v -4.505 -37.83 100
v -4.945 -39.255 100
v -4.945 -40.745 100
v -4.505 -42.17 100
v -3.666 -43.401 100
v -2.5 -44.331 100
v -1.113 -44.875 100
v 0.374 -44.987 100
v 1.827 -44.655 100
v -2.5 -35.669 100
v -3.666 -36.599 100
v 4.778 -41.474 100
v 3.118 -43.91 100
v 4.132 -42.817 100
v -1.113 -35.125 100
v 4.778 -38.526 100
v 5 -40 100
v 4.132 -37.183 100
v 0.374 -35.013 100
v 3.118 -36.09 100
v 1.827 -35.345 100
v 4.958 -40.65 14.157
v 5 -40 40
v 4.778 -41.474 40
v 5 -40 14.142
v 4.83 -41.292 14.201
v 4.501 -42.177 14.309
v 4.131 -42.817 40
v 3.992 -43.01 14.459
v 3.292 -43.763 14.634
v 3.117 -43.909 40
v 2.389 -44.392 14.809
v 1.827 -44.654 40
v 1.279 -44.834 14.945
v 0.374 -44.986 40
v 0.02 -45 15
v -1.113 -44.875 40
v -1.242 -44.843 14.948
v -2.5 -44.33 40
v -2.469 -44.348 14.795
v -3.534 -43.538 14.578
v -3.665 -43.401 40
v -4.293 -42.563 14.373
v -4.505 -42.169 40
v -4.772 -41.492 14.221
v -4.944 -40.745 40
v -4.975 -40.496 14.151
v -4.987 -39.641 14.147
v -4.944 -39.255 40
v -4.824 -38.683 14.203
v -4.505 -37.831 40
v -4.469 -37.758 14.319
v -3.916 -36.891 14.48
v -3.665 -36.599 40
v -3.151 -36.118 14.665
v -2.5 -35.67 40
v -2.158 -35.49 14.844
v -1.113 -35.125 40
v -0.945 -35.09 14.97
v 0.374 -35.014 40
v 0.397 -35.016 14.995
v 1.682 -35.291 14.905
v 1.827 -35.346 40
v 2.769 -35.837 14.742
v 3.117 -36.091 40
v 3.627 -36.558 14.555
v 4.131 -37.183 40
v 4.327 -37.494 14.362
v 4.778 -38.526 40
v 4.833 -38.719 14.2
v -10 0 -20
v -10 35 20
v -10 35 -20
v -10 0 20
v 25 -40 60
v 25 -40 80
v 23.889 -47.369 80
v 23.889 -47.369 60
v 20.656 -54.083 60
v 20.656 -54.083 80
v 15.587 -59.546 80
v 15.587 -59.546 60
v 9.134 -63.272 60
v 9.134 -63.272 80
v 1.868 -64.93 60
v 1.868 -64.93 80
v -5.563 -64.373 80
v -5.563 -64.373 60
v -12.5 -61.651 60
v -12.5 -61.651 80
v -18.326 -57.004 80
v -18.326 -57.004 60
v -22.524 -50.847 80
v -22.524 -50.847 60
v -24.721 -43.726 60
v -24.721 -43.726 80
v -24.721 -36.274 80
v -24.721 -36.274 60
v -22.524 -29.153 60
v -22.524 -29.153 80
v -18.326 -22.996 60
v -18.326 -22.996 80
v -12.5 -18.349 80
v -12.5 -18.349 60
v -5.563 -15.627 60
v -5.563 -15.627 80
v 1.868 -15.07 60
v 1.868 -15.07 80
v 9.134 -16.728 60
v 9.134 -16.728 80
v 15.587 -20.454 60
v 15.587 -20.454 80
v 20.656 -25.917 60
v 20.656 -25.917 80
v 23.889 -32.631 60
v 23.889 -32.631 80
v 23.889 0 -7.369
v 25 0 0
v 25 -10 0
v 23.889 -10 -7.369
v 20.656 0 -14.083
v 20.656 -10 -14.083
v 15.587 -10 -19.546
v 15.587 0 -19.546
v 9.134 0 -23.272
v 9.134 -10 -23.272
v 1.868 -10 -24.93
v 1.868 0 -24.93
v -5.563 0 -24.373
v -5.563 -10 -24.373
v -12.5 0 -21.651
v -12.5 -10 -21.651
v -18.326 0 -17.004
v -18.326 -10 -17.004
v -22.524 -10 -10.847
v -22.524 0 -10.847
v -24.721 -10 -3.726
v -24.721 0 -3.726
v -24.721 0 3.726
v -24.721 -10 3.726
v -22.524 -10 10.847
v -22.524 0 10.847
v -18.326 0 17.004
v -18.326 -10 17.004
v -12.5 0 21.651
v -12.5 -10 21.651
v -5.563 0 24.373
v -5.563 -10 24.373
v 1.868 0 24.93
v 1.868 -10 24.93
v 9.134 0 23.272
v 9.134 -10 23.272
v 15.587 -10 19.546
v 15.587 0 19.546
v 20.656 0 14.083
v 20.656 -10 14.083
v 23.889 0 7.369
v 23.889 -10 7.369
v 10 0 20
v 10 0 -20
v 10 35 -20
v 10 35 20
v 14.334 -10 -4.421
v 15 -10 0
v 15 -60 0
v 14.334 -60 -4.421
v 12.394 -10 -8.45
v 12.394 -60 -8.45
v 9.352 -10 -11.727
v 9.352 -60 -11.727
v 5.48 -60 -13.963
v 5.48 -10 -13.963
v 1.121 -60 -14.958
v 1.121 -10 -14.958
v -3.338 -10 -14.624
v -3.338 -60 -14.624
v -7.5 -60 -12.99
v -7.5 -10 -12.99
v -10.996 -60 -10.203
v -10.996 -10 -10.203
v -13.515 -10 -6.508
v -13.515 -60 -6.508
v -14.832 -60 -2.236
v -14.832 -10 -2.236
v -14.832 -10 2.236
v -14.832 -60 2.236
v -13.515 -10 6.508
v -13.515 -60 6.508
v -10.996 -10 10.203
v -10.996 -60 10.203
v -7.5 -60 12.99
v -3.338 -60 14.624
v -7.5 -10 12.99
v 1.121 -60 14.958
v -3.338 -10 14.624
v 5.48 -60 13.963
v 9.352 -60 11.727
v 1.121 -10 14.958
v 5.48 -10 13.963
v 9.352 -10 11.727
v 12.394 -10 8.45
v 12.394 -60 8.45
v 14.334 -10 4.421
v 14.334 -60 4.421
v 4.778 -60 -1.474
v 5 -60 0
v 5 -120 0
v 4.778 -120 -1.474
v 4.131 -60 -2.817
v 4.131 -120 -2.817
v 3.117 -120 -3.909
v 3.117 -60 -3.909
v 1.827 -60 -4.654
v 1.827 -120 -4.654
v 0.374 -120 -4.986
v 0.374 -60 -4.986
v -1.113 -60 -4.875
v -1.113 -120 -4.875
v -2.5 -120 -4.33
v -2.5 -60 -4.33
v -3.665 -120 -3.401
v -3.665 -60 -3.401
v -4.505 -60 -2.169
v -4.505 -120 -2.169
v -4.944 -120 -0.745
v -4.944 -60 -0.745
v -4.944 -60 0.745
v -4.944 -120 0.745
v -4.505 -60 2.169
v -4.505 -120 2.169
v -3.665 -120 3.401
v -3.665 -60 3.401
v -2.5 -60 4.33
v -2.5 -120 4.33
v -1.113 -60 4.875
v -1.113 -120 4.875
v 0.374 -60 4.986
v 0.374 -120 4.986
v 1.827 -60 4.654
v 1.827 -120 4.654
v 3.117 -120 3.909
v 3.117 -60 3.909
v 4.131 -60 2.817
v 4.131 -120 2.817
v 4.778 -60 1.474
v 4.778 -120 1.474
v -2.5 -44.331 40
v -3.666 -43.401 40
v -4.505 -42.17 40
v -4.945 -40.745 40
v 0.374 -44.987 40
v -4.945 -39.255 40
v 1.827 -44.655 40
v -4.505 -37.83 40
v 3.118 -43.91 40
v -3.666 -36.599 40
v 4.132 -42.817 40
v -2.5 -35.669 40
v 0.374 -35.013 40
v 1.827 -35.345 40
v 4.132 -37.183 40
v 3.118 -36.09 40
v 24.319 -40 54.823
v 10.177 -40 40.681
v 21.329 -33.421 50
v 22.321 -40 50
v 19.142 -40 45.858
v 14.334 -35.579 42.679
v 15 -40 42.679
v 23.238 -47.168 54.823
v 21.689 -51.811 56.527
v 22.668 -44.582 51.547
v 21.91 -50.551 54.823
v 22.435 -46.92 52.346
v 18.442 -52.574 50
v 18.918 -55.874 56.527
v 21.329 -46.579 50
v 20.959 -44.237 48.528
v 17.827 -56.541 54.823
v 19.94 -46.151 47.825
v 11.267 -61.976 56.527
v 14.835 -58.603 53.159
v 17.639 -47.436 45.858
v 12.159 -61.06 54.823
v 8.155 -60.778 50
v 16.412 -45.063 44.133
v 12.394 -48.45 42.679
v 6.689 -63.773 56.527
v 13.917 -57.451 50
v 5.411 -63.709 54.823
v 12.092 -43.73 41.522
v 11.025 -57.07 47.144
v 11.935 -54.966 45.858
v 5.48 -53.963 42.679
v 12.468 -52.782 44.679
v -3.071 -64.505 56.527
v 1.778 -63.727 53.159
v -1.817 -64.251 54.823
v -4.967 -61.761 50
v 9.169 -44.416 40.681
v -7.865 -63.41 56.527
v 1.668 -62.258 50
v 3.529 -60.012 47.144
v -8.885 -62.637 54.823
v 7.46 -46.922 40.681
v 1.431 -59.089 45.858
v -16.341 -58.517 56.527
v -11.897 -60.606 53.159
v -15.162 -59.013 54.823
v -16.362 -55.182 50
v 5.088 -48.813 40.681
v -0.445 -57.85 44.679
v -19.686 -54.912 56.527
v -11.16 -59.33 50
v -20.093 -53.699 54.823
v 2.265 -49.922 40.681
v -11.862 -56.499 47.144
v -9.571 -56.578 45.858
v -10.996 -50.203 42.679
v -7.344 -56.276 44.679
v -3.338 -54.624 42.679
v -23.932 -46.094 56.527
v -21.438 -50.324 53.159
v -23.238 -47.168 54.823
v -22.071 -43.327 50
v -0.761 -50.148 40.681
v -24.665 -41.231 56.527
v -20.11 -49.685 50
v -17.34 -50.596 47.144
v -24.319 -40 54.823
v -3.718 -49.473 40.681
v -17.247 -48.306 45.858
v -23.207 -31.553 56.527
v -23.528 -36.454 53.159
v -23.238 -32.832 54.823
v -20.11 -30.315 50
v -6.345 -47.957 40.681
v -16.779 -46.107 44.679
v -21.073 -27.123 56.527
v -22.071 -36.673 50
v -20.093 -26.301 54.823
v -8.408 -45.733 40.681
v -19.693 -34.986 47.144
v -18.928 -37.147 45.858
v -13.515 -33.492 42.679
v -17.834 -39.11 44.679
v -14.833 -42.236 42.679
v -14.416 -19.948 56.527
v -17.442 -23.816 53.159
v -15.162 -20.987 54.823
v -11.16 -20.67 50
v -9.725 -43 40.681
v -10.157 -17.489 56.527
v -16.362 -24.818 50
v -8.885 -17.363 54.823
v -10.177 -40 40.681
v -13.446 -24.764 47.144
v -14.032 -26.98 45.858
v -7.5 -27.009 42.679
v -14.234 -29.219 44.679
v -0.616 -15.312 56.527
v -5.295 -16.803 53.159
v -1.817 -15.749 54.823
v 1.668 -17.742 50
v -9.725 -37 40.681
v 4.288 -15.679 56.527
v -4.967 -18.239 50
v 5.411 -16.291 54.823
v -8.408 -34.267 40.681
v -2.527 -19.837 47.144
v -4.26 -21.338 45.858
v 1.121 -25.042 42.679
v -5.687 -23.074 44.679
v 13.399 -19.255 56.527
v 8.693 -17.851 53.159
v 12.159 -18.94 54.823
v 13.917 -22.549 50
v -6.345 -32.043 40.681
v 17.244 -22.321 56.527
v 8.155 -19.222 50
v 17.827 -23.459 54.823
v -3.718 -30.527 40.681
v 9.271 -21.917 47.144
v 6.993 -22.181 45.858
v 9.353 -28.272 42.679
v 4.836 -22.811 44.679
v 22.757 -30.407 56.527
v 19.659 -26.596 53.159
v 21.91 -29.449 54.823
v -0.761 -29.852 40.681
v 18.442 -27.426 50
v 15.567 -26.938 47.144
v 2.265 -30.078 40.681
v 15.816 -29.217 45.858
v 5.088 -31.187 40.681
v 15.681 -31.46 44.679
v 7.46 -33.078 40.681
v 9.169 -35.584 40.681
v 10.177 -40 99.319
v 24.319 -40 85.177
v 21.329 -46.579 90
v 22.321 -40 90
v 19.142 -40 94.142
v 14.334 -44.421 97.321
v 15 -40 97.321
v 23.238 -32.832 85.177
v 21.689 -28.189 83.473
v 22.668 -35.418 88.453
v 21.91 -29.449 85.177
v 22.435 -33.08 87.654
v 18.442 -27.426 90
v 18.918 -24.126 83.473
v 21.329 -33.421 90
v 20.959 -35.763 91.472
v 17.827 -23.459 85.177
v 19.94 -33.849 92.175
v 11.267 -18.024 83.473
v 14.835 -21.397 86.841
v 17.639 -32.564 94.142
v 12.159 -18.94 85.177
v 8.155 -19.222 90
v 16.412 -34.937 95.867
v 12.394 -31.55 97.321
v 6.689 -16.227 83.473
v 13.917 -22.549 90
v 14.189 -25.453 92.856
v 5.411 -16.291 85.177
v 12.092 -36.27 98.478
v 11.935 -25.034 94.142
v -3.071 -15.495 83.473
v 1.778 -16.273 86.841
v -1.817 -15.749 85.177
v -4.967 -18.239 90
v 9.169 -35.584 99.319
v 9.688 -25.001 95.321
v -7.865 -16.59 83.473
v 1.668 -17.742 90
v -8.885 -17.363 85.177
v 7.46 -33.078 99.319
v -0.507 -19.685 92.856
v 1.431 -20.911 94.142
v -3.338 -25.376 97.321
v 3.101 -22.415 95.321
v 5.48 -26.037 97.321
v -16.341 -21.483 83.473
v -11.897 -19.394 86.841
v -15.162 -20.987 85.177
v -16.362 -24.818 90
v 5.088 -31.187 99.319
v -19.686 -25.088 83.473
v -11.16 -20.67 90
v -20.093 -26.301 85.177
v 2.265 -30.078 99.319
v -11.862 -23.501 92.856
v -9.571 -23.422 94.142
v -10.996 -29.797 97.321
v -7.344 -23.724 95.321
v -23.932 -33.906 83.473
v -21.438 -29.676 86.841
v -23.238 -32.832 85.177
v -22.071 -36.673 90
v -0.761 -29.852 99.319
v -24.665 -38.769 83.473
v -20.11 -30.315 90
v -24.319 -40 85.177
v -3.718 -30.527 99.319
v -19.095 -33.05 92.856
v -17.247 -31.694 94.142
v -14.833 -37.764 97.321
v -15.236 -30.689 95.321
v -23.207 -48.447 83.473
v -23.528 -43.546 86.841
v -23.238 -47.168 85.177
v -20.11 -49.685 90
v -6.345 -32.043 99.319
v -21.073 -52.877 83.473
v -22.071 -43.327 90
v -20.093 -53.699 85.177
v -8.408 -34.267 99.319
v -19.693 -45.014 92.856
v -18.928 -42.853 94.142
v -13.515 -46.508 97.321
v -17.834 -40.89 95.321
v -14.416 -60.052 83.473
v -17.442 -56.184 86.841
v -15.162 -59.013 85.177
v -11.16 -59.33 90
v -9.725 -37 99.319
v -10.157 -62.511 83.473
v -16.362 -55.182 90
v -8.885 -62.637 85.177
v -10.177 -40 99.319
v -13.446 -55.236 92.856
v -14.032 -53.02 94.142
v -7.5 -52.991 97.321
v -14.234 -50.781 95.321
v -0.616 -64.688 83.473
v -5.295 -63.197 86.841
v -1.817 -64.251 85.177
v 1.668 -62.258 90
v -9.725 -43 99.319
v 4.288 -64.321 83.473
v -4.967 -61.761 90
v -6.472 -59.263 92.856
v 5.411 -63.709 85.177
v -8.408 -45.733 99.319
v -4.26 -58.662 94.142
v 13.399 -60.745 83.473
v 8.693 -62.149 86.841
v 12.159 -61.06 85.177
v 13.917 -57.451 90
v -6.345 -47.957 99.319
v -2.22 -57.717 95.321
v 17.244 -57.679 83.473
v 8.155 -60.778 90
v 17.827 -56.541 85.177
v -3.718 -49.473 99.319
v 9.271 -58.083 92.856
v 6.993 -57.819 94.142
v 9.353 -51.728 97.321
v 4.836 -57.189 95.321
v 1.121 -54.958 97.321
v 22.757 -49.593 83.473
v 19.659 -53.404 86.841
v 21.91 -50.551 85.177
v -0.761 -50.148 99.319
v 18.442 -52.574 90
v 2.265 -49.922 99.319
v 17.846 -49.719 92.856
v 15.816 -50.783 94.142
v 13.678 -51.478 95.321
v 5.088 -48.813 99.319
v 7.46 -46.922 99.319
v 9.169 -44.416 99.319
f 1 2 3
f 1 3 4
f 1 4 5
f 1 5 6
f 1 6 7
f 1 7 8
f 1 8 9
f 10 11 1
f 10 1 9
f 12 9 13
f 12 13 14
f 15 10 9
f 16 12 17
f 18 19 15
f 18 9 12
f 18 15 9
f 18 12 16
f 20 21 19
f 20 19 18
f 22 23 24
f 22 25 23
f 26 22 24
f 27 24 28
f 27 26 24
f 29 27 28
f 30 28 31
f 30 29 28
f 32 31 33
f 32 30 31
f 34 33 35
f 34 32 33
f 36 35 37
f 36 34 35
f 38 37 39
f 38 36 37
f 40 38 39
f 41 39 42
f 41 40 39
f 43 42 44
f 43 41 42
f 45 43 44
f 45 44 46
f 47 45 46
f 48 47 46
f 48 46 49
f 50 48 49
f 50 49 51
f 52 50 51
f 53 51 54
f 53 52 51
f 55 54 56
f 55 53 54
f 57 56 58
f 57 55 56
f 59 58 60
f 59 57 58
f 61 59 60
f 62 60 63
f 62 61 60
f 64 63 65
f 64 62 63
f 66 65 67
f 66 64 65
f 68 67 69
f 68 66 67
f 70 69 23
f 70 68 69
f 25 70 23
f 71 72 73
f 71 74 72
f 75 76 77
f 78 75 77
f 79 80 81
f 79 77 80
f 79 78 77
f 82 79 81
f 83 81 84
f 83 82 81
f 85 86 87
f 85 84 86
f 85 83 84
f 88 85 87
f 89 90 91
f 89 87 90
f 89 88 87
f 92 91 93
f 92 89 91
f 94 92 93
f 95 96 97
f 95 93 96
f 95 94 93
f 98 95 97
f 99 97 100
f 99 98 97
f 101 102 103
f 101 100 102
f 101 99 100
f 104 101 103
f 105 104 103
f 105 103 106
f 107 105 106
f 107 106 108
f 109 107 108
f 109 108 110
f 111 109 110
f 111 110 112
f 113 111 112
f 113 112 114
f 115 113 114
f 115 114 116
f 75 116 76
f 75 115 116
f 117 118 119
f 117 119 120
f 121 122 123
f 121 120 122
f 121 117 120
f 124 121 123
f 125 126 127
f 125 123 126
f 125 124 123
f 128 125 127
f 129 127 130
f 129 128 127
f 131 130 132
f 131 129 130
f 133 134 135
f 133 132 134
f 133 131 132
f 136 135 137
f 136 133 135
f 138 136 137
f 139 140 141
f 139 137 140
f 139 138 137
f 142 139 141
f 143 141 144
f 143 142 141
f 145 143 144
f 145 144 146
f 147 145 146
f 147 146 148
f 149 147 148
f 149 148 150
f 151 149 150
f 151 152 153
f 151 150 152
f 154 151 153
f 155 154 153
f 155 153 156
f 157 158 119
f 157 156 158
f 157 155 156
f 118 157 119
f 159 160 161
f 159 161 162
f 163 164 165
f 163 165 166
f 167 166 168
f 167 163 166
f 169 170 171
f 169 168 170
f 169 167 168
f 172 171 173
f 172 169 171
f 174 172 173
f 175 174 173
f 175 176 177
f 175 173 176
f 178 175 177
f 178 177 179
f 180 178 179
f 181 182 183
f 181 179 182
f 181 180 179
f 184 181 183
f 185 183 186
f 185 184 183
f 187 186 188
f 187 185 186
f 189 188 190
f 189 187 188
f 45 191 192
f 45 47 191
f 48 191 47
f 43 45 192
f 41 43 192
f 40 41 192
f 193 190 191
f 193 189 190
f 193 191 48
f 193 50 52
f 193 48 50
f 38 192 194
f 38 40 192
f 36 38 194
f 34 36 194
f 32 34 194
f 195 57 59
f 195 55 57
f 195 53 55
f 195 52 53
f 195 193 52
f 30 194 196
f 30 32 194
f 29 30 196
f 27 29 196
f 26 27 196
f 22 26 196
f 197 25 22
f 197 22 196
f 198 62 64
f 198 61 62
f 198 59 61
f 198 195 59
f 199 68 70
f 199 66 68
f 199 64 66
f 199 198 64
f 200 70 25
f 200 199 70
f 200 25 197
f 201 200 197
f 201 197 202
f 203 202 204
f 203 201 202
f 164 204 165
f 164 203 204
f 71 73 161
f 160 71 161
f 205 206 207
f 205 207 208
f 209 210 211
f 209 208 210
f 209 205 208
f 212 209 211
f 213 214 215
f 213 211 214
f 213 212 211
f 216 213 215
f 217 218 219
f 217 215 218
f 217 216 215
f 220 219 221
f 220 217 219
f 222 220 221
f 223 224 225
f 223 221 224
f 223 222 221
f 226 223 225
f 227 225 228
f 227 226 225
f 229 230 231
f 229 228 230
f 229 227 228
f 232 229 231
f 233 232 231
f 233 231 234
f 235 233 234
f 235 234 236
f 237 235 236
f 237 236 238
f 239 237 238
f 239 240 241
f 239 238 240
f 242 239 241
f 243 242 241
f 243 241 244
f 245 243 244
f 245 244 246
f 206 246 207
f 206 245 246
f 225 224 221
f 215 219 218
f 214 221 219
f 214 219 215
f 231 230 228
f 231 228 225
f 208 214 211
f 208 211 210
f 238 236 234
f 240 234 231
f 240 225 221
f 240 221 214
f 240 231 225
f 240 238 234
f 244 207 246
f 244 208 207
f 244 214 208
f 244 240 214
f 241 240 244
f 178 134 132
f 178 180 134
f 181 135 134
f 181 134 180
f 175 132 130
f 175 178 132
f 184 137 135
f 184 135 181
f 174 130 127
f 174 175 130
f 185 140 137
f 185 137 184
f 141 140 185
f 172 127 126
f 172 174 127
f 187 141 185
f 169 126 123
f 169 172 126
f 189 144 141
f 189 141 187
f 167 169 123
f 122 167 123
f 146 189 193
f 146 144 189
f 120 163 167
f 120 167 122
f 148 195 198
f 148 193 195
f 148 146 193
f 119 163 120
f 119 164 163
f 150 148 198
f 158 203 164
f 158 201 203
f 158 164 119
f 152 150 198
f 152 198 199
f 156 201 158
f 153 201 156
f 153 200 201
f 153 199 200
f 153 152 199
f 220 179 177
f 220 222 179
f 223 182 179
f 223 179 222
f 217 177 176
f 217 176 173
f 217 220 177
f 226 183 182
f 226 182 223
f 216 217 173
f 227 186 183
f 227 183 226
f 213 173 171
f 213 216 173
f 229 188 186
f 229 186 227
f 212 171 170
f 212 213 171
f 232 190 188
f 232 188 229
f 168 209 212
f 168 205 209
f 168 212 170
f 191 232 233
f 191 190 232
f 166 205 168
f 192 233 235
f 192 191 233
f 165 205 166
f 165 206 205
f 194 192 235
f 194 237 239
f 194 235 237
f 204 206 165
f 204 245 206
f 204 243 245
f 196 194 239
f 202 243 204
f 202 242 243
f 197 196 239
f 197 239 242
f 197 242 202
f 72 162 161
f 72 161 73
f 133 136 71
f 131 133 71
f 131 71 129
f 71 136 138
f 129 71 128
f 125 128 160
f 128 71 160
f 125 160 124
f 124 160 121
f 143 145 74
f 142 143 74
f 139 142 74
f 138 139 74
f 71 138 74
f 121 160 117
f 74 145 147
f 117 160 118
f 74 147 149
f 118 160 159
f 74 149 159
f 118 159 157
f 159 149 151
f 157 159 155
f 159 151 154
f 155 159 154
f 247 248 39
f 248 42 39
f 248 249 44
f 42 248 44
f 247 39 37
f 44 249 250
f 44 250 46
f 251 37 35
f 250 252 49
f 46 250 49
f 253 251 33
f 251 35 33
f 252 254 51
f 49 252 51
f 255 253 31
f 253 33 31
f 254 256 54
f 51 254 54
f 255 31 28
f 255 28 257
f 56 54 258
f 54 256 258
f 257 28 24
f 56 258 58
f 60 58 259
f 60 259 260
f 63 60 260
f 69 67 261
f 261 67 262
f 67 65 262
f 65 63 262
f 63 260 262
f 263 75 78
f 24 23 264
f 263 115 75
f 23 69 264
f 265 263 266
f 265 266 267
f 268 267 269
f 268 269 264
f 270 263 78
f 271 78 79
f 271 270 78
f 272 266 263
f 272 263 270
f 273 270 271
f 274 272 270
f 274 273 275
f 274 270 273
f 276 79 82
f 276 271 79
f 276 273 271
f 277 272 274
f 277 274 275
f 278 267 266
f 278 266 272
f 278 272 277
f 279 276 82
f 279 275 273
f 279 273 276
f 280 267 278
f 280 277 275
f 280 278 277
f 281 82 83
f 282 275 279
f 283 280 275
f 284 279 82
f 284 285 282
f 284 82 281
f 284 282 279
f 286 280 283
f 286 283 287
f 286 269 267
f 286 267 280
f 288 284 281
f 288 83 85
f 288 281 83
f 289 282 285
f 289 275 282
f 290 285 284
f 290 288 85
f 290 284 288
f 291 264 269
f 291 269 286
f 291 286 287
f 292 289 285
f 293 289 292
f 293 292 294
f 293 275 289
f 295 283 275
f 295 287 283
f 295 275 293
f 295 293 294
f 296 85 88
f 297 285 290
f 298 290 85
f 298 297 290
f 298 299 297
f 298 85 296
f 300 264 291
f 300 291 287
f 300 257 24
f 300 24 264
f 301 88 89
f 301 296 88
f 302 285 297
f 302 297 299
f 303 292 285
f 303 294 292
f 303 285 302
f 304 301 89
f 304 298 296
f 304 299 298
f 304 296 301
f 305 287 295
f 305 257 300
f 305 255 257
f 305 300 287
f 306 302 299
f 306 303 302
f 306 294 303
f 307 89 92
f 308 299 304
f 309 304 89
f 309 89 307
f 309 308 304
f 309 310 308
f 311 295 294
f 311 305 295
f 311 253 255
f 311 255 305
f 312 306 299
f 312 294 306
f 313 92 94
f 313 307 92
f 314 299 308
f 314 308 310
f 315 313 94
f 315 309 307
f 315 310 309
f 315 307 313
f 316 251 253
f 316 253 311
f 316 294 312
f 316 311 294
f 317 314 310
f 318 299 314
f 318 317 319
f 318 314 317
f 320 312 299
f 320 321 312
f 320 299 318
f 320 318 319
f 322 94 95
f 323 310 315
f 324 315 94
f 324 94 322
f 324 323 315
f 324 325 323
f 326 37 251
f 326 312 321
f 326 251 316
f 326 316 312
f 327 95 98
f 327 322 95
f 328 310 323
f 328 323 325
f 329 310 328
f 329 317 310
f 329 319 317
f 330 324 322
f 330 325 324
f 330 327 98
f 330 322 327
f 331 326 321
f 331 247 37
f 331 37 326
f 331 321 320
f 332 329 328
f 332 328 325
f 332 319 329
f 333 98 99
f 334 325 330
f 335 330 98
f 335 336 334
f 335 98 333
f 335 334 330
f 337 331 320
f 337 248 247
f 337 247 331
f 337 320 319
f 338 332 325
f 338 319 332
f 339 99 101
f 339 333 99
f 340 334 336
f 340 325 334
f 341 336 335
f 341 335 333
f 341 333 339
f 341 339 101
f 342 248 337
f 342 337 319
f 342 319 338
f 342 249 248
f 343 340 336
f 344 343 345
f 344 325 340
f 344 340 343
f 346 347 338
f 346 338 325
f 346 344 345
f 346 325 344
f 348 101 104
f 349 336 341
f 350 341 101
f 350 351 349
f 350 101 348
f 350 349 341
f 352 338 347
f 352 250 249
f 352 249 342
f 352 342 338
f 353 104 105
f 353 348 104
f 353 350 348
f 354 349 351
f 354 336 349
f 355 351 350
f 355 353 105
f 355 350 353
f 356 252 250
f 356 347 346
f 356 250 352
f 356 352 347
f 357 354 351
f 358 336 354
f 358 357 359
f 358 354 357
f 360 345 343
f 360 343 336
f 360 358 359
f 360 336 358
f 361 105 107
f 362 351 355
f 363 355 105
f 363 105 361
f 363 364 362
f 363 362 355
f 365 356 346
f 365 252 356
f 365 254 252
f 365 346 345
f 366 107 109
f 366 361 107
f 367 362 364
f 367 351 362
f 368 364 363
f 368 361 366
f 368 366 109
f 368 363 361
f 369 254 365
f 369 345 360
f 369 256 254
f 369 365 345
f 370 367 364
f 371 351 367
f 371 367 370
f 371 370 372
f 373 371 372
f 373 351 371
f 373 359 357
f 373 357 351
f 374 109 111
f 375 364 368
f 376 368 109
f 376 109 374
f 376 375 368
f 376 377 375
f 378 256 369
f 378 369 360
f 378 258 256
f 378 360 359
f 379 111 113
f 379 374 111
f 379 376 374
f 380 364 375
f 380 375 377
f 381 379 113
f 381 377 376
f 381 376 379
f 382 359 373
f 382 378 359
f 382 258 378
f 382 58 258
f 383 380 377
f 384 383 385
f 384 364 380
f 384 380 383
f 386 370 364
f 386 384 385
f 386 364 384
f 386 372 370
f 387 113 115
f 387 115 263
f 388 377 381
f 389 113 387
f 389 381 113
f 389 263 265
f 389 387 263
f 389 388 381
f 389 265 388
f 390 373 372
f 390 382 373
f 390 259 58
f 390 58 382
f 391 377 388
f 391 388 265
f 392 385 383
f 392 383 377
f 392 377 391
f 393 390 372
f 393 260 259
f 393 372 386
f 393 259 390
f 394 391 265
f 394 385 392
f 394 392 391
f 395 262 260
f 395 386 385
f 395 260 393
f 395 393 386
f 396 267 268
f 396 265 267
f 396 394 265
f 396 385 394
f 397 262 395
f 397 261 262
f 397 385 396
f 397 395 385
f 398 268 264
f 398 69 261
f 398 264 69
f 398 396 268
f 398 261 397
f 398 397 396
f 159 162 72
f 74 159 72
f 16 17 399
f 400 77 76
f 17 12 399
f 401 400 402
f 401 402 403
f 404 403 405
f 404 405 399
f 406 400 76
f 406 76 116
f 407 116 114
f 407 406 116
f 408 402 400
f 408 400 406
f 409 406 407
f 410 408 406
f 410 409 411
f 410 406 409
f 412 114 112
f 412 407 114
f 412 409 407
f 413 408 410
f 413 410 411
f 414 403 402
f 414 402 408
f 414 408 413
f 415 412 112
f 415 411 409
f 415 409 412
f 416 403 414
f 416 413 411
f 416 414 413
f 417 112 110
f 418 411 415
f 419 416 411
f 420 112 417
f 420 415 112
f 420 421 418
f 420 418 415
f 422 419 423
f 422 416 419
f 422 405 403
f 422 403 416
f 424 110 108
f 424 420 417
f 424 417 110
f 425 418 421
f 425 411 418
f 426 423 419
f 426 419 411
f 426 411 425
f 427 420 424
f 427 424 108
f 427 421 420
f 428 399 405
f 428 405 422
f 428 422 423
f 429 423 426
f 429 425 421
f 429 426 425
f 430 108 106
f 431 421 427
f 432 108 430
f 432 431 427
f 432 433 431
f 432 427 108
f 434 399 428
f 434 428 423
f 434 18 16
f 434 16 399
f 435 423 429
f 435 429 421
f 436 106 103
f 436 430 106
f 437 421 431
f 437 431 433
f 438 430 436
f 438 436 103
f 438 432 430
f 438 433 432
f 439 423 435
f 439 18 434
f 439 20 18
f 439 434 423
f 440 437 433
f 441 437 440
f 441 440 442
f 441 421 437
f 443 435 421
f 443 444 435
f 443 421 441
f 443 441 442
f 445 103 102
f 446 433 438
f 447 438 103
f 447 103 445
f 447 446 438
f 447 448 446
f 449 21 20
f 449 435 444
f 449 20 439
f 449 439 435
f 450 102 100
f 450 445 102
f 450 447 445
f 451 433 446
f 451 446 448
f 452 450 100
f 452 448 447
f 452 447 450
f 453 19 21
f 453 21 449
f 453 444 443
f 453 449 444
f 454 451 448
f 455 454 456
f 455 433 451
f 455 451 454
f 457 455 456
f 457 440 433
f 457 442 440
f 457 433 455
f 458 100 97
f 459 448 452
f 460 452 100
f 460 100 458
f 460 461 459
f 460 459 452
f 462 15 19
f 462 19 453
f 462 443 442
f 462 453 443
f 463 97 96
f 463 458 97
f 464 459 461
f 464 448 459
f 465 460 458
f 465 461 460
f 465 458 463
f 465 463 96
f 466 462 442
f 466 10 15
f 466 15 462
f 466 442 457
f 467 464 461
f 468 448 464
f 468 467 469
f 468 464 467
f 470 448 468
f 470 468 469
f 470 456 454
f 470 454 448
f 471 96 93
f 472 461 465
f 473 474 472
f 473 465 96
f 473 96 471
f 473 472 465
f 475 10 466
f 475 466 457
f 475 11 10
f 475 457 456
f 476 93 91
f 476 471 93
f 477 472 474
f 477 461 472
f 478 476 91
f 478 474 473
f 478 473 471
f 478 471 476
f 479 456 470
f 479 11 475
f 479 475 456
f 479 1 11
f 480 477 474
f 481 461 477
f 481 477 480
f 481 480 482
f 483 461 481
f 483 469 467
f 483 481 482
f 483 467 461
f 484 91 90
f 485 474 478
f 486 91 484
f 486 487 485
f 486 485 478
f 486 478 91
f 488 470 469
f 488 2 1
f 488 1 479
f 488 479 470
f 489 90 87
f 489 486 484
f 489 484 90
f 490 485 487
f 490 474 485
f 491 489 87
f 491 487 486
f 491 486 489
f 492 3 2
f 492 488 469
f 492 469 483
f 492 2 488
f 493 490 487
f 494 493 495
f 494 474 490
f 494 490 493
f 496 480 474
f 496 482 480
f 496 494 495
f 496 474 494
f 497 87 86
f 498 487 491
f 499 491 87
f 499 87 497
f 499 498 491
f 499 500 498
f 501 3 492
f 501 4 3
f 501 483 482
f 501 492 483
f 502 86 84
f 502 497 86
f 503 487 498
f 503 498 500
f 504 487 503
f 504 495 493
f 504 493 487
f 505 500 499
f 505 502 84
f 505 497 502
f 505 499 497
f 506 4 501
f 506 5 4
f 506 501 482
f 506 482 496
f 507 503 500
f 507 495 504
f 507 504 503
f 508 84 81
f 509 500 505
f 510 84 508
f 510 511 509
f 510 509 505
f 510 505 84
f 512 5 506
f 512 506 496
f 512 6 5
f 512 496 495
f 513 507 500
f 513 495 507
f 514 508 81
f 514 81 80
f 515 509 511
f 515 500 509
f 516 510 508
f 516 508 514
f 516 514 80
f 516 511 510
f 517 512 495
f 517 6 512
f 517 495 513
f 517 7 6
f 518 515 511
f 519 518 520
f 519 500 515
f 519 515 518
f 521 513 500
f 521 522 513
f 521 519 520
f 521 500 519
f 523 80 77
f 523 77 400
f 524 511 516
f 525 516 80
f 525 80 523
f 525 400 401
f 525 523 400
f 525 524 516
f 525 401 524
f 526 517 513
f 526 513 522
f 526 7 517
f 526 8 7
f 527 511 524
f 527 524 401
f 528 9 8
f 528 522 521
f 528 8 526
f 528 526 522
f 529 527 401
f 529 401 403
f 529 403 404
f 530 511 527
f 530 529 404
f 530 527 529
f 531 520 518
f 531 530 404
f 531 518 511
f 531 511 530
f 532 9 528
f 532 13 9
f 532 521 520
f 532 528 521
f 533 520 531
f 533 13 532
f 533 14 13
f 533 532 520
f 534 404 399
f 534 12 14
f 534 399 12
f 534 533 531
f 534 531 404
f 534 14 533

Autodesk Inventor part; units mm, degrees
ref_plane "YZ Plane" through (0, 0, 0) normal (1, 0, 0) x (0, 1, 0)
ref_plane "XZ Plane" through (0, 0, 0) normal (0, 1, 0) x (-1, 0, 0)
ref_plane "XY Plane" through (0, 0, 0) normal (0, 0, 1) x (1, 0, 0)
sketch "Skizze1" plane through (0, 0, 0) normal (0, 1, 0) x (-1, 0, 0)
  line L0 (10, -20) -> (-10, -20)
  line L1 (-10, -20) -> (-10, 20)
  line L2 (-10, 20) -> (10, 20)
  line L3 (10, 20) -> (10, -20)
  line L4 (10, -20) -> (-10, 20) construction
  line L5 (-10, -20) -> (10, 20) construction
  point P0 (0, 0)
  dimension "d0" = 20
  dimension "d1" = 40
extrude "Extrusion1" add sketch "Skizze1" along normal blind 35
sketch "Skizze2" plane through (0, 0, 0) normal (0, -1, 0) x (1, 0, 0)
  circle A0 centre (0, 0) radius 25
  dimension "d4" = 50
extrude "Extrusion2" add sketch "Skizze2" along normal blind 10
sketch "Skizze3" plane through (0, -10, 0) normal (0, -1, 0) x (1, 0, 0)
  circle A0 centre (0, 0) radius 15
  dimension "d7" = 30
extrude "Extrusion3" add sketch "Skizze3" along normal blind 50
sketch "Skizze4" plane through (0, 0, 0) normal (0, 0, 1) x (1, 0, 0)
  circle A0 centre (0, -40) radius 5
  point P0 (0, 0)
  dimension "d10" = 10
  dimension "d13" = 40
extrude "Extrusion4" add sketch "Skizze4" along normal blind 40
sketch "Skizze5" plane through (0, -40, 40) normal (0, 0, 1) x (1, 0, 0)
  circle A0 centre (0, 0) radius 25
  point P0 (0, 40)
  dimension "d14" = 50
extrude "Extrusion5" add sketch "Skizze5" along normal blind 60
fillet "Rundung1" radius 20 2 edges at (-25, -40, 100) (-25, -40, 40)
sketch "Skizze6" plane through (0, -60, 0) normal (0, -1, 0) x (1, 0, 0)
  circle A0 centre (0, 0) radius 5
  dimension "d18" = 10
extrude "Extrusion6" add sketch "Skizze6" along normal blind 60
properties part number "Lackierkopf"
